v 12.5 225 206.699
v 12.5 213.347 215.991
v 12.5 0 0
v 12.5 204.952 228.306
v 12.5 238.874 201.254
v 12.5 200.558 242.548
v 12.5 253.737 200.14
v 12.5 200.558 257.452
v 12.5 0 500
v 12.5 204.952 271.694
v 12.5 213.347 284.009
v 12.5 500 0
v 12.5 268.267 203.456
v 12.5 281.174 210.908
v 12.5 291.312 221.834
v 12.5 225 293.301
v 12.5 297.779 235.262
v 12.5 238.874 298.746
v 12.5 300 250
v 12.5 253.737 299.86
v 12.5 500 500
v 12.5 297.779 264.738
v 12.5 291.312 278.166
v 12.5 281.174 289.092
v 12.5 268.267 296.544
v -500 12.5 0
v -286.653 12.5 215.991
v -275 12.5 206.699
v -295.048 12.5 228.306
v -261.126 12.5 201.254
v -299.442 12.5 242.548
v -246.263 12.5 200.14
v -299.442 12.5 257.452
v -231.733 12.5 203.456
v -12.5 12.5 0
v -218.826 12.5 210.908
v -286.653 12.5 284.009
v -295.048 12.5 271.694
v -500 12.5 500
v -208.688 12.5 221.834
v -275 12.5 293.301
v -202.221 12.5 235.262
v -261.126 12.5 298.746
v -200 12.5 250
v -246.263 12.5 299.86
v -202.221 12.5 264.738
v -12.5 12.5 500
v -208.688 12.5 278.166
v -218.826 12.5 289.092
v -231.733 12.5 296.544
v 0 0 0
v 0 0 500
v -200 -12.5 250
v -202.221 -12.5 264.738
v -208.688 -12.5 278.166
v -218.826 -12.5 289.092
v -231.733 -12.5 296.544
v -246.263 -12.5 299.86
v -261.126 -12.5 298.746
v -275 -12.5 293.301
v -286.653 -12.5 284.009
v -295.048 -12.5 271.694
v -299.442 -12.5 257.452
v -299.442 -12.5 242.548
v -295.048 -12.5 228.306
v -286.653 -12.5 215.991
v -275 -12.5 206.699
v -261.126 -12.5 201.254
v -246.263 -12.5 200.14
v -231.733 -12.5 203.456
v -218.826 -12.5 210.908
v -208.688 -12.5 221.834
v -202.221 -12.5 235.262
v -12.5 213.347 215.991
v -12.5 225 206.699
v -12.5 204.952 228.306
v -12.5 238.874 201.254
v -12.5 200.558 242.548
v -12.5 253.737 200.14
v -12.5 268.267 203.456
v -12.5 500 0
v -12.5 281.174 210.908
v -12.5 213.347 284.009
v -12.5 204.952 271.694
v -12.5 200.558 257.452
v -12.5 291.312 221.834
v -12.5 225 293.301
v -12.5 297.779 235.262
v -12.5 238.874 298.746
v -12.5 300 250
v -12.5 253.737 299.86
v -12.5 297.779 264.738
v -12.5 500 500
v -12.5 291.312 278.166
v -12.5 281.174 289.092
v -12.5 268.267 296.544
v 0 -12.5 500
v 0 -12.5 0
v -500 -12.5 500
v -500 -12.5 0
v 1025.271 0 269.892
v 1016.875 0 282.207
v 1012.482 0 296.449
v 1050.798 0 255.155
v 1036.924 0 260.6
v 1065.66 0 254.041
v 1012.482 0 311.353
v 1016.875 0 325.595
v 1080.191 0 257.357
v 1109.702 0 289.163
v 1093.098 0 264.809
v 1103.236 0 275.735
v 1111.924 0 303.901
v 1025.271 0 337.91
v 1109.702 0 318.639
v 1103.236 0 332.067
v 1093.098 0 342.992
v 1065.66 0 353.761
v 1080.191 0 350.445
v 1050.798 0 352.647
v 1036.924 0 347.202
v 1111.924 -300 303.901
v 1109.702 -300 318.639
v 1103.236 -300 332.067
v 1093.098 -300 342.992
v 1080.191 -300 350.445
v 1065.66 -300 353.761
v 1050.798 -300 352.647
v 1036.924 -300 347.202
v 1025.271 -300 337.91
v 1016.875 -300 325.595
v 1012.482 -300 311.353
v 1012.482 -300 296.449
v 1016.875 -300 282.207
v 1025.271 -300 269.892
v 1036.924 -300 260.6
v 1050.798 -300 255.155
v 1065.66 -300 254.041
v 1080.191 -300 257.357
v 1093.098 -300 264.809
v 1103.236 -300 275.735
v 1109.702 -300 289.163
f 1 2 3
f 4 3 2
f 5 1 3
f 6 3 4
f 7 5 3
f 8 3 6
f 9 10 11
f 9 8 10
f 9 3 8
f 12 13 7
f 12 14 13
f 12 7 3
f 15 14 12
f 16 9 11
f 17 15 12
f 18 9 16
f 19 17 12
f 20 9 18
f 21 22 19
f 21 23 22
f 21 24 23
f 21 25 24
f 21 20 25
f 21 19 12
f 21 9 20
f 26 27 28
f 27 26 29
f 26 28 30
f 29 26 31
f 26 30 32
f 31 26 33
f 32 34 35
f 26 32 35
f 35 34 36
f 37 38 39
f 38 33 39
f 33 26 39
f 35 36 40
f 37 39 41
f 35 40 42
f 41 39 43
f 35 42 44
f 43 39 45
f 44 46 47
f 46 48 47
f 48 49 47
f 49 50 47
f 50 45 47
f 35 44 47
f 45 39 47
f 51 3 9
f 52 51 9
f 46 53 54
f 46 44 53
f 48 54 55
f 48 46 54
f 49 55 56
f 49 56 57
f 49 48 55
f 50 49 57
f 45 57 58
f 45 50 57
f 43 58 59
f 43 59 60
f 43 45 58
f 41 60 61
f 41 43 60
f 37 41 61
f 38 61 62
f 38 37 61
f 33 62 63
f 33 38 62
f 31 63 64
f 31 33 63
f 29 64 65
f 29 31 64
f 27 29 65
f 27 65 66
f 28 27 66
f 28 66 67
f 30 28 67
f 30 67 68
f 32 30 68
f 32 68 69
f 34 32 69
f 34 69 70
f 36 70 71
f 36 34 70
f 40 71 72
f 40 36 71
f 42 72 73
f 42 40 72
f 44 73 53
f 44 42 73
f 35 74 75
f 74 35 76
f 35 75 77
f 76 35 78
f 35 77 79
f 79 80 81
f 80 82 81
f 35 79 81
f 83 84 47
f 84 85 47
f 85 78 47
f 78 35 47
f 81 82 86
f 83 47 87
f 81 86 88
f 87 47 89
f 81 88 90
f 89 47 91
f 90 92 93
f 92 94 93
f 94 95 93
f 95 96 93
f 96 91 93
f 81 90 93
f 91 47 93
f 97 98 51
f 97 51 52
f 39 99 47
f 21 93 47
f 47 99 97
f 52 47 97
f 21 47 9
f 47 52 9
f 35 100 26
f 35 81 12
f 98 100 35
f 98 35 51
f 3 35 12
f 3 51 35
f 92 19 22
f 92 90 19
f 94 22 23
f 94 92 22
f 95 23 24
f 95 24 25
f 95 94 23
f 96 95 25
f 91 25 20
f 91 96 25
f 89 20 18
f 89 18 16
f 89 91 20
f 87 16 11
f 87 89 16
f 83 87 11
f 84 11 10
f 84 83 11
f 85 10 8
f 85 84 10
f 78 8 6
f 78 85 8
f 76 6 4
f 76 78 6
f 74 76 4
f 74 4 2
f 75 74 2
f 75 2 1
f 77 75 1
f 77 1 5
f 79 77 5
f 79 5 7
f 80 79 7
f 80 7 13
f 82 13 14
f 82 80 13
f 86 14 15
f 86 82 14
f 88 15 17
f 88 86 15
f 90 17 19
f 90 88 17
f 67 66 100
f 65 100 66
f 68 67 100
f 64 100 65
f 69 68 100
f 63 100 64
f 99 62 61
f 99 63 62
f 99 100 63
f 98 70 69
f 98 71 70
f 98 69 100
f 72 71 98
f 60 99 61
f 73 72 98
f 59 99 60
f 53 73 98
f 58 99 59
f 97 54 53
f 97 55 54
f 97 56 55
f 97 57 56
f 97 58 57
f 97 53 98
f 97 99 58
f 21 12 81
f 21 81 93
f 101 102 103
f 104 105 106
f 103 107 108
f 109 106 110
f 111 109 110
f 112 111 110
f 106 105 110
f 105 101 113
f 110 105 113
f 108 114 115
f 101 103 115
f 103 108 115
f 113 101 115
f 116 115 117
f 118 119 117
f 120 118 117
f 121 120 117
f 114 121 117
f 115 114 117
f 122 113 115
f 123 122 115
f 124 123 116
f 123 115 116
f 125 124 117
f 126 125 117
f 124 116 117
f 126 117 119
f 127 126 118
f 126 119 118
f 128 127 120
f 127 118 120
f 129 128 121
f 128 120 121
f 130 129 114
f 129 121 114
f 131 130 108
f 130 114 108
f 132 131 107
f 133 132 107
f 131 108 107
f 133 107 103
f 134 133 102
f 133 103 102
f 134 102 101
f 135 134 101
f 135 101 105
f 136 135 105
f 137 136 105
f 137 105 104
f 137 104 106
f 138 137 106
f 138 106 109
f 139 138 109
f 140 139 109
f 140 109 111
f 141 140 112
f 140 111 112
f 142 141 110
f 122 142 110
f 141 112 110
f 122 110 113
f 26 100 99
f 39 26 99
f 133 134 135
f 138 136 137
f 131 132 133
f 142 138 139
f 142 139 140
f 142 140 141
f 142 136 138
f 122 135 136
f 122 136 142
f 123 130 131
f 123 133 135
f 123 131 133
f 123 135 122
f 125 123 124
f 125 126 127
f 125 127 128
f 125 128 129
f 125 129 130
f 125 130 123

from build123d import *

# Parameters (mm, degrees)
F0_W     = 500
F0_H     = 500
F0_R     = 50
F1_DEPTH = 12.5
F2_W     = 500
F2_H     = 500
F2_R     = 50
F3_DEPTH = 12.5
F4_R     = 50
F5_DEPTH = 300


with BuildPart() as f1:
    # F0 (on Front) → F1 (new body, symmetric)
    with BuildSketch(Plane.XZ):
        with Locations((-250, 250)):
            Rectangle(F0_W, F0_H)
        with Locations((-250, 250)):
            Circle(F0_R, mode=Mode.SUBTRACT)
    extrude(amount=F1_DEPTH, both=True)

    # F2 (on Right) → F3 (join, symmetric)
    with BuildSketch(Plane.YZ):
        with Locations((250, 250)):
            Rectangle(F2_W, F2_H)
        with Locations((250, 250)):
            Circle(F2_R, mode=Mode.SUBTRACT)
    extrude(amount=F3_DEPTH, both=True)


with BuildPart() as f5:
    # F4 (on Front) → F5 (new body)
    with BuildSketch(Plane.XZ):
        with Locations((1061.923623, 303.900898)):
            Circle(F4_R)
    extrude(amount=F5_DEPTH)


solid = Compound([f1.part, f5.part])
